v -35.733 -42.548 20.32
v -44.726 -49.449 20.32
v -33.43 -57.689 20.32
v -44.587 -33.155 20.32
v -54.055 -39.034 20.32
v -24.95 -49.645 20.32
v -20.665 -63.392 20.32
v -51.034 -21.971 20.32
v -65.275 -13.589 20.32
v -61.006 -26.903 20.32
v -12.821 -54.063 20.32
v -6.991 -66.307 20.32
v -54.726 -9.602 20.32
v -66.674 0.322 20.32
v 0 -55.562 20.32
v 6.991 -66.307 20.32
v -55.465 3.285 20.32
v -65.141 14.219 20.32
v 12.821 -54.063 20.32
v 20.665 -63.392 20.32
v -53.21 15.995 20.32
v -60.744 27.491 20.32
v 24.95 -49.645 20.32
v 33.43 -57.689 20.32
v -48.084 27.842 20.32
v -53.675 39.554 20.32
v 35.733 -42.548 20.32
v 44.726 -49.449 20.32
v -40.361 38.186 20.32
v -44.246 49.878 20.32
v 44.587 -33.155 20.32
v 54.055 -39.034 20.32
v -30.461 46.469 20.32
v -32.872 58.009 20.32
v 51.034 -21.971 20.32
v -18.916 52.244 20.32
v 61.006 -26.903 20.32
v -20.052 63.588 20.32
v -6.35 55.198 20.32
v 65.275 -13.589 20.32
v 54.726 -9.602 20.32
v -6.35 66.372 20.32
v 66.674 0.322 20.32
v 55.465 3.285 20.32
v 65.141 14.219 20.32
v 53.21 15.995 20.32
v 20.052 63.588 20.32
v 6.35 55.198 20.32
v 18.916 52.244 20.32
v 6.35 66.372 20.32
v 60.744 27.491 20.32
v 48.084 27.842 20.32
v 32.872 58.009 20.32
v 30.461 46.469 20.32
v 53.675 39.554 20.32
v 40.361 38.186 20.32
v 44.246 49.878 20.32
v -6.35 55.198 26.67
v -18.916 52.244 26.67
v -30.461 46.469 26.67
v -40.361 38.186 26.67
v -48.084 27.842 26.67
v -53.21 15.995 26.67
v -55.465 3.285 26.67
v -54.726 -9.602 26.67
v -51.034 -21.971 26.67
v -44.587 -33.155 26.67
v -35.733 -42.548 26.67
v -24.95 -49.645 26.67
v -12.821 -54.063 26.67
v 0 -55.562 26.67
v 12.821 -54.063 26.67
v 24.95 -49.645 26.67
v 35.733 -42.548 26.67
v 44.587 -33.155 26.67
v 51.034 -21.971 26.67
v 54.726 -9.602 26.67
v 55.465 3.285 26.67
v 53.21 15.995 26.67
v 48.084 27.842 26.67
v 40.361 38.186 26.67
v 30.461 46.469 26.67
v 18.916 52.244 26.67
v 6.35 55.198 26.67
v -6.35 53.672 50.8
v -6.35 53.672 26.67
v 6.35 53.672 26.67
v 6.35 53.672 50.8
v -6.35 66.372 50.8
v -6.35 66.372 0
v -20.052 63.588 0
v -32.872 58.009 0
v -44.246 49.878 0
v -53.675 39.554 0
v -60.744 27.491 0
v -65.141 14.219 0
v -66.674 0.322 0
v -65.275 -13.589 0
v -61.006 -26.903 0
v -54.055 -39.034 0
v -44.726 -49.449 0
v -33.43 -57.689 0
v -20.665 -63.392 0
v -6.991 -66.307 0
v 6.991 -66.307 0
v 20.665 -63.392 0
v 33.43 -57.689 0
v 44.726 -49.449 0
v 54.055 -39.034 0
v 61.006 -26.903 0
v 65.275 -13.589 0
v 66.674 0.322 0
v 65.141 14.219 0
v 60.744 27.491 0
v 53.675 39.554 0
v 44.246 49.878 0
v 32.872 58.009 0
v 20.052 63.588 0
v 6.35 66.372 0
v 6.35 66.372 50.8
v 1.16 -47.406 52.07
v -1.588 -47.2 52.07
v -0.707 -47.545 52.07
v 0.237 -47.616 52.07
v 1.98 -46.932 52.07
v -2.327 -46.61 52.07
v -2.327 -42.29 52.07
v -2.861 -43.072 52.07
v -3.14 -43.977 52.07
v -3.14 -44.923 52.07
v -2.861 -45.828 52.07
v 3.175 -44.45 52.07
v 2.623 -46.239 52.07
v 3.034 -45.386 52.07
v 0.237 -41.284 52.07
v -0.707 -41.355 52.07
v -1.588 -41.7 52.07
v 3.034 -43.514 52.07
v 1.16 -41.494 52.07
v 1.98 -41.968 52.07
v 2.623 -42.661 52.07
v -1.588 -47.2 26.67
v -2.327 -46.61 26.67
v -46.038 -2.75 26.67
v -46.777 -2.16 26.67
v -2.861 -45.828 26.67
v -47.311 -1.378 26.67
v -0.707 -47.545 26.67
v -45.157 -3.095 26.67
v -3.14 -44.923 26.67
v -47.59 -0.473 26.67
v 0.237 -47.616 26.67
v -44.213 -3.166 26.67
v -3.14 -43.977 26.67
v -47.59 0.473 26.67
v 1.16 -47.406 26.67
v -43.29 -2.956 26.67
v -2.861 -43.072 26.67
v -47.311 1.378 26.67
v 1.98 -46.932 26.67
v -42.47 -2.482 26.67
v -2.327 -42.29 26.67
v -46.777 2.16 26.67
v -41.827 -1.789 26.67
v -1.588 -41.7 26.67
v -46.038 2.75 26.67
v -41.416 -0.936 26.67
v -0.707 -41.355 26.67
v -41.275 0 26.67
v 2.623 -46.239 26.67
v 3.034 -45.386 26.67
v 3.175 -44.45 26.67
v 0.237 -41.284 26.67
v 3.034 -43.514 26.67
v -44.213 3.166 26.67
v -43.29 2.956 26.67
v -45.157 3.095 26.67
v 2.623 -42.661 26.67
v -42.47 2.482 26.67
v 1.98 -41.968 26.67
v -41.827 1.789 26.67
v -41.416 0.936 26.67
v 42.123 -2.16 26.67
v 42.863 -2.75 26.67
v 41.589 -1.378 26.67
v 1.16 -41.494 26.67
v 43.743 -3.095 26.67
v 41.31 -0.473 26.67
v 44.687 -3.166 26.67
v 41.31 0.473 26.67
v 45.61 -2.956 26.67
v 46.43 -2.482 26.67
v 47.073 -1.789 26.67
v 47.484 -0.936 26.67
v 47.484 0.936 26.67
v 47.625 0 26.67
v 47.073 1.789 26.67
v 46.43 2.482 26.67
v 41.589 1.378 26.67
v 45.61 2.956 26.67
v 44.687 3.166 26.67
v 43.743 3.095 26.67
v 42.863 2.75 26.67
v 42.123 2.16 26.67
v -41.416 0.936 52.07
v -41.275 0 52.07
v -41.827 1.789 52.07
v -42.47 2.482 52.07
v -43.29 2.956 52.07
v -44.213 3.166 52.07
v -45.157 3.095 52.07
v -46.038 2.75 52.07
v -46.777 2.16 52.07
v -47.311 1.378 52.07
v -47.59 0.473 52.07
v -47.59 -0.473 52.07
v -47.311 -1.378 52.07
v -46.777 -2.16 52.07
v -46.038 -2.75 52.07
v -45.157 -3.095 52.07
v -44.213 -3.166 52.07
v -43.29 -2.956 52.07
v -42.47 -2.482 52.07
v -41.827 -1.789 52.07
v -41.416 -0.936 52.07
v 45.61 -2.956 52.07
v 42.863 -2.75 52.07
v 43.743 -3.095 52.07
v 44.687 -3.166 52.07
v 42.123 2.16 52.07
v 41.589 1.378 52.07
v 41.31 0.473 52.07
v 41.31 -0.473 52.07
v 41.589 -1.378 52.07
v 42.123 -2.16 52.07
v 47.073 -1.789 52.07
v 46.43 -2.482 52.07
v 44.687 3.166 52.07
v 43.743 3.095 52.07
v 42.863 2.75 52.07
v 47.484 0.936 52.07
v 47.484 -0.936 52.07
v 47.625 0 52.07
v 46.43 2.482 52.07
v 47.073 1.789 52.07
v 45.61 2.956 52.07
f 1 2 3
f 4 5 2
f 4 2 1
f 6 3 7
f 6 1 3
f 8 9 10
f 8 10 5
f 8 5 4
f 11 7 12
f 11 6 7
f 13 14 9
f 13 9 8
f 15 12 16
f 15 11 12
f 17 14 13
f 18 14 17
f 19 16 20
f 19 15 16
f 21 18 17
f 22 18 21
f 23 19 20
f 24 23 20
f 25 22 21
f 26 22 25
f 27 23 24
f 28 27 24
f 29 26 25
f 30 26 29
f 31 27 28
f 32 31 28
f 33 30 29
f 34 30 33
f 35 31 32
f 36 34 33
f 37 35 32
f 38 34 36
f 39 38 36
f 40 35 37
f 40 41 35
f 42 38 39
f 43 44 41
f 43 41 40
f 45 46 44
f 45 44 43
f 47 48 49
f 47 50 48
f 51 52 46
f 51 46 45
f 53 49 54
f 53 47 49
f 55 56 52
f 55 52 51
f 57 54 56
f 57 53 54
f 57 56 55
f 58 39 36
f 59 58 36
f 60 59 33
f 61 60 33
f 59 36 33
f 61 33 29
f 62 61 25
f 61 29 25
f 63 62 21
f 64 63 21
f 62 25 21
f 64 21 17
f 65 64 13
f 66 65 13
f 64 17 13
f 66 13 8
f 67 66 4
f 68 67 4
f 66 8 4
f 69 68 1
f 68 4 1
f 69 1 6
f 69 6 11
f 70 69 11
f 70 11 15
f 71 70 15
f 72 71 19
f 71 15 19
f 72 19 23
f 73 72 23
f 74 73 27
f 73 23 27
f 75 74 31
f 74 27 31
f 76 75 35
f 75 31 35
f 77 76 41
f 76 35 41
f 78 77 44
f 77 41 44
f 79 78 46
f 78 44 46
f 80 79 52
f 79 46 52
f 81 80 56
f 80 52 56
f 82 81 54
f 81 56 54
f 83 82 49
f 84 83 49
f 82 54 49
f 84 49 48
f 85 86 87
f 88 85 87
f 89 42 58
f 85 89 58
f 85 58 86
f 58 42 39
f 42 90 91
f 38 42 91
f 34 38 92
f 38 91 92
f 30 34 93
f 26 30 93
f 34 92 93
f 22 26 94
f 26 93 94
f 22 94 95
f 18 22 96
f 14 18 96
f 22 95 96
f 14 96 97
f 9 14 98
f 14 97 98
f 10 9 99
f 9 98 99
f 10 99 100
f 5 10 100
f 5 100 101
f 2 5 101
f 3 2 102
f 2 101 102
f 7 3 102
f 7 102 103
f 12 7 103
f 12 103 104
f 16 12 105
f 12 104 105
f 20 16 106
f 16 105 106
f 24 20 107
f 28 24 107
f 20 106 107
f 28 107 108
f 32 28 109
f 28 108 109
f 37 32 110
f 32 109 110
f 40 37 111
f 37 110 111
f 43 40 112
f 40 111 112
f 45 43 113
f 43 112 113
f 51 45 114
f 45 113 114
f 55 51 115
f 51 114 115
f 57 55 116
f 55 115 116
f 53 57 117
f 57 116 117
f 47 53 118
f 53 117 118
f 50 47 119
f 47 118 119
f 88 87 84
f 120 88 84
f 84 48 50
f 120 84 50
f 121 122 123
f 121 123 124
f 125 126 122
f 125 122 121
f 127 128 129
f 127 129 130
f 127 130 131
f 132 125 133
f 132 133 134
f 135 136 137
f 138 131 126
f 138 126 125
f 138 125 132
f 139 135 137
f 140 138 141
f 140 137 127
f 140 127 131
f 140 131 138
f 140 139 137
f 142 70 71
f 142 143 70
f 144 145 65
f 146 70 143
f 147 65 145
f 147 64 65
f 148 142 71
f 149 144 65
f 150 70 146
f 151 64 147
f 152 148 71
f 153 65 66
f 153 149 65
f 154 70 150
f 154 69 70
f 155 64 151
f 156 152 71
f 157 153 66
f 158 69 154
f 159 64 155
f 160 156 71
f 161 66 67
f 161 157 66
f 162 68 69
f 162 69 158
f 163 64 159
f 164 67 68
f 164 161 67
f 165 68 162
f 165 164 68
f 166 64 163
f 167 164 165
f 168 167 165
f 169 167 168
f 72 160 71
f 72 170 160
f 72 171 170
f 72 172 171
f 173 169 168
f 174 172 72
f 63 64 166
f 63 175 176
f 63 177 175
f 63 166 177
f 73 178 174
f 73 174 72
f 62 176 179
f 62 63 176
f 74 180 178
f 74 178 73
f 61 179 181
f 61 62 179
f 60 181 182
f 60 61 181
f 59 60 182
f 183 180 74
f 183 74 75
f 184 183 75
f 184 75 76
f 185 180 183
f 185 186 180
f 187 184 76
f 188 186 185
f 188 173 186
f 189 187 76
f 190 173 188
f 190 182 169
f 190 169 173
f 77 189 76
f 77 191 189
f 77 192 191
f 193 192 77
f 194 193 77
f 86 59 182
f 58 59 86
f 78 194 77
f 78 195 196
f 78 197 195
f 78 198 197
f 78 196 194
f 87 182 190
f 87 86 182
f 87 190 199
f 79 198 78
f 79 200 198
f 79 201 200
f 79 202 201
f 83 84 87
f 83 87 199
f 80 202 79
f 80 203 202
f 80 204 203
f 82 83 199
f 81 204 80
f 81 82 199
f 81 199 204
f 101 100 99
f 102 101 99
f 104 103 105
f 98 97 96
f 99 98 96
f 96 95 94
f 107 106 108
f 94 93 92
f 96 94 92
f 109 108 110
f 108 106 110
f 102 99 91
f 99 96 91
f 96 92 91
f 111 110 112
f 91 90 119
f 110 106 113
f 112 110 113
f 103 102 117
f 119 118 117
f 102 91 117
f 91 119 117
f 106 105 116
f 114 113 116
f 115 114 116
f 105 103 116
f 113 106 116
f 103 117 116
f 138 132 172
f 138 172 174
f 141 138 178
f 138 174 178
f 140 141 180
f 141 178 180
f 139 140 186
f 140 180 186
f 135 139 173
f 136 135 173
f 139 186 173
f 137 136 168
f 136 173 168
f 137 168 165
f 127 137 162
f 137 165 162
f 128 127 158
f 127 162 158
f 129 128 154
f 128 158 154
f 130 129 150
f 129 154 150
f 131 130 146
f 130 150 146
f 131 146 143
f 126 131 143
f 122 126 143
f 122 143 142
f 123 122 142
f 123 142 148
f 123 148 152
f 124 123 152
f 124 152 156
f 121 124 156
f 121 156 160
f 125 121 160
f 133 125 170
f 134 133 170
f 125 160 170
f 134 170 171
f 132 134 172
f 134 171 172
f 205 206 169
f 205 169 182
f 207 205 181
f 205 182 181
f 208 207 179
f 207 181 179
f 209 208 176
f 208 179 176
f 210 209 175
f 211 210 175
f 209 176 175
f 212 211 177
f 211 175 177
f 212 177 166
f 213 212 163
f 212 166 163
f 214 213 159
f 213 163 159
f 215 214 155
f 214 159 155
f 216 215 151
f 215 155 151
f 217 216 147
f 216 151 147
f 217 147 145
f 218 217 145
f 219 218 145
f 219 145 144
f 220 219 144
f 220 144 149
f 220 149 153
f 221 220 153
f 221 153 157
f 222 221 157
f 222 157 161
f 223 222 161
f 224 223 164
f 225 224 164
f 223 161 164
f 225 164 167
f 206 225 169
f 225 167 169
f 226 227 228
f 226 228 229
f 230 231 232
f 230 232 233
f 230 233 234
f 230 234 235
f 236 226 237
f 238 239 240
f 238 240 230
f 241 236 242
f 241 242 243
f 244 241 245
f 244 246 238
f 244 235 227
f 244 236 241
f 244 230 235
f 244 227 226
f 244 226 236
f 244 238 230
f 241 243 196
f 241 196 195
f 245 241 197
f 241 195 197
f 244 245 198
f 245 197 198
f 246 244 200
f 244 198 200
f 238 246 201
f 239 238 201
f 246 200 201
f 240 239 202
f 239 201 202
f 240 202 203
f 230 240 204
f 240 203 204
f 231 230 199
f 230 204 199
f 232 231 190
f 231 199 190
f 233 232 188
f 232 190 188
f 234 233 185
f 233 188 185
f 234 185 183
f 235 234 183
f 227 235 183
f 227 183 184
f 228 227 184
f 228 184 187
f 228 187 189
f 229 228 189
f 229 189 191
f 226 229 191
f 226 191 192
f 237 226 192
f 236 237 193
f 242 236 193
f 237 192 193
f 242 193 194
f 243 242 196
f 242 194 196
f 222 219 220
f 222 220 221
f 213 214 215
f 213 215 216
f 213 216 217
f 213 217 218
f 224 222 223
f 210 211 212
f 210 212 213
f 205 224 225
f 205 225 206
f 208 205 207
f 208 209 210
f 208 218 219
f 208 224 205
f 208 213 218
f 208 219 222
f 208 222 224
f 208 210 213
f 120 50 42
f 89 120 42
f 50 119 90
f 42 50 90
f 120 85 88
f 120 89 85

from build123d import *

# Parameters (mm, degrees)
F1_DEPTH = 20.32
F3_DEPTH = 6.35
F5_DEPTH = 50.8
F6_R     = 3.175
F7_DEPTH = 25.4


with BuildPart() as f1:
    # F0 (on Top) → F1 (new body)
    with BuildSketch(Plane.XY):
        with BuildLine():
            Line((-6.35, 53.67193), (-6.35, 66.37193))
            ThreePointArc((-6.35, 66.37193), (0, -66.675), (6.35, 66.37193))
            Line((6.35, 66.37193), (6.35, 53.67193))
            Line((6.35, 53.67193), (-6.35, 53.67193))
        make_face()
    extrude(amount=F1_DEPTH)

    # F2 (on face) → F3 (join)
    with BuildSketch(Plane.XY.offset(20.32)):
        with BuildLine():
            Line((-6.35, 53.67193), (-6.35, 55.19845))
            ThreePointArc((-6.35, 55.19845), (0, -55.5625), (6.35, 55.19845))
            Line((6.35, 55.19845), (6.35, 53.67193))
            Line((6.35, 53.67193), (-6.35, 53.67193))
        make_face()
    extrude(amount=F3_DEPTH)

    # F4 (on Top) → F5 (join)
    with BuildSketch(Plane.XY):
        Polygon((-6.35, 55.19845), (-6.35, 53.67193), (6.35, 53.67193), (6.35, 66.37193), (-6.35, 66.37193), align=None)
    extrude(amount=F5_DEPTH)

    # F6 (on face) → F7 (join)
    with BuildSketch(Plane.XY.offset(26.67)):
        with Locations((44.45, 0)):
            Circle(F6_R)
        with Locations((0, -44.45)):
            Circle(F6_R)
        with Locations((-44.45, 0)):
            Circle(F6_R)
    extrude(amount=F7_DEPTH)


solid = f1.part
